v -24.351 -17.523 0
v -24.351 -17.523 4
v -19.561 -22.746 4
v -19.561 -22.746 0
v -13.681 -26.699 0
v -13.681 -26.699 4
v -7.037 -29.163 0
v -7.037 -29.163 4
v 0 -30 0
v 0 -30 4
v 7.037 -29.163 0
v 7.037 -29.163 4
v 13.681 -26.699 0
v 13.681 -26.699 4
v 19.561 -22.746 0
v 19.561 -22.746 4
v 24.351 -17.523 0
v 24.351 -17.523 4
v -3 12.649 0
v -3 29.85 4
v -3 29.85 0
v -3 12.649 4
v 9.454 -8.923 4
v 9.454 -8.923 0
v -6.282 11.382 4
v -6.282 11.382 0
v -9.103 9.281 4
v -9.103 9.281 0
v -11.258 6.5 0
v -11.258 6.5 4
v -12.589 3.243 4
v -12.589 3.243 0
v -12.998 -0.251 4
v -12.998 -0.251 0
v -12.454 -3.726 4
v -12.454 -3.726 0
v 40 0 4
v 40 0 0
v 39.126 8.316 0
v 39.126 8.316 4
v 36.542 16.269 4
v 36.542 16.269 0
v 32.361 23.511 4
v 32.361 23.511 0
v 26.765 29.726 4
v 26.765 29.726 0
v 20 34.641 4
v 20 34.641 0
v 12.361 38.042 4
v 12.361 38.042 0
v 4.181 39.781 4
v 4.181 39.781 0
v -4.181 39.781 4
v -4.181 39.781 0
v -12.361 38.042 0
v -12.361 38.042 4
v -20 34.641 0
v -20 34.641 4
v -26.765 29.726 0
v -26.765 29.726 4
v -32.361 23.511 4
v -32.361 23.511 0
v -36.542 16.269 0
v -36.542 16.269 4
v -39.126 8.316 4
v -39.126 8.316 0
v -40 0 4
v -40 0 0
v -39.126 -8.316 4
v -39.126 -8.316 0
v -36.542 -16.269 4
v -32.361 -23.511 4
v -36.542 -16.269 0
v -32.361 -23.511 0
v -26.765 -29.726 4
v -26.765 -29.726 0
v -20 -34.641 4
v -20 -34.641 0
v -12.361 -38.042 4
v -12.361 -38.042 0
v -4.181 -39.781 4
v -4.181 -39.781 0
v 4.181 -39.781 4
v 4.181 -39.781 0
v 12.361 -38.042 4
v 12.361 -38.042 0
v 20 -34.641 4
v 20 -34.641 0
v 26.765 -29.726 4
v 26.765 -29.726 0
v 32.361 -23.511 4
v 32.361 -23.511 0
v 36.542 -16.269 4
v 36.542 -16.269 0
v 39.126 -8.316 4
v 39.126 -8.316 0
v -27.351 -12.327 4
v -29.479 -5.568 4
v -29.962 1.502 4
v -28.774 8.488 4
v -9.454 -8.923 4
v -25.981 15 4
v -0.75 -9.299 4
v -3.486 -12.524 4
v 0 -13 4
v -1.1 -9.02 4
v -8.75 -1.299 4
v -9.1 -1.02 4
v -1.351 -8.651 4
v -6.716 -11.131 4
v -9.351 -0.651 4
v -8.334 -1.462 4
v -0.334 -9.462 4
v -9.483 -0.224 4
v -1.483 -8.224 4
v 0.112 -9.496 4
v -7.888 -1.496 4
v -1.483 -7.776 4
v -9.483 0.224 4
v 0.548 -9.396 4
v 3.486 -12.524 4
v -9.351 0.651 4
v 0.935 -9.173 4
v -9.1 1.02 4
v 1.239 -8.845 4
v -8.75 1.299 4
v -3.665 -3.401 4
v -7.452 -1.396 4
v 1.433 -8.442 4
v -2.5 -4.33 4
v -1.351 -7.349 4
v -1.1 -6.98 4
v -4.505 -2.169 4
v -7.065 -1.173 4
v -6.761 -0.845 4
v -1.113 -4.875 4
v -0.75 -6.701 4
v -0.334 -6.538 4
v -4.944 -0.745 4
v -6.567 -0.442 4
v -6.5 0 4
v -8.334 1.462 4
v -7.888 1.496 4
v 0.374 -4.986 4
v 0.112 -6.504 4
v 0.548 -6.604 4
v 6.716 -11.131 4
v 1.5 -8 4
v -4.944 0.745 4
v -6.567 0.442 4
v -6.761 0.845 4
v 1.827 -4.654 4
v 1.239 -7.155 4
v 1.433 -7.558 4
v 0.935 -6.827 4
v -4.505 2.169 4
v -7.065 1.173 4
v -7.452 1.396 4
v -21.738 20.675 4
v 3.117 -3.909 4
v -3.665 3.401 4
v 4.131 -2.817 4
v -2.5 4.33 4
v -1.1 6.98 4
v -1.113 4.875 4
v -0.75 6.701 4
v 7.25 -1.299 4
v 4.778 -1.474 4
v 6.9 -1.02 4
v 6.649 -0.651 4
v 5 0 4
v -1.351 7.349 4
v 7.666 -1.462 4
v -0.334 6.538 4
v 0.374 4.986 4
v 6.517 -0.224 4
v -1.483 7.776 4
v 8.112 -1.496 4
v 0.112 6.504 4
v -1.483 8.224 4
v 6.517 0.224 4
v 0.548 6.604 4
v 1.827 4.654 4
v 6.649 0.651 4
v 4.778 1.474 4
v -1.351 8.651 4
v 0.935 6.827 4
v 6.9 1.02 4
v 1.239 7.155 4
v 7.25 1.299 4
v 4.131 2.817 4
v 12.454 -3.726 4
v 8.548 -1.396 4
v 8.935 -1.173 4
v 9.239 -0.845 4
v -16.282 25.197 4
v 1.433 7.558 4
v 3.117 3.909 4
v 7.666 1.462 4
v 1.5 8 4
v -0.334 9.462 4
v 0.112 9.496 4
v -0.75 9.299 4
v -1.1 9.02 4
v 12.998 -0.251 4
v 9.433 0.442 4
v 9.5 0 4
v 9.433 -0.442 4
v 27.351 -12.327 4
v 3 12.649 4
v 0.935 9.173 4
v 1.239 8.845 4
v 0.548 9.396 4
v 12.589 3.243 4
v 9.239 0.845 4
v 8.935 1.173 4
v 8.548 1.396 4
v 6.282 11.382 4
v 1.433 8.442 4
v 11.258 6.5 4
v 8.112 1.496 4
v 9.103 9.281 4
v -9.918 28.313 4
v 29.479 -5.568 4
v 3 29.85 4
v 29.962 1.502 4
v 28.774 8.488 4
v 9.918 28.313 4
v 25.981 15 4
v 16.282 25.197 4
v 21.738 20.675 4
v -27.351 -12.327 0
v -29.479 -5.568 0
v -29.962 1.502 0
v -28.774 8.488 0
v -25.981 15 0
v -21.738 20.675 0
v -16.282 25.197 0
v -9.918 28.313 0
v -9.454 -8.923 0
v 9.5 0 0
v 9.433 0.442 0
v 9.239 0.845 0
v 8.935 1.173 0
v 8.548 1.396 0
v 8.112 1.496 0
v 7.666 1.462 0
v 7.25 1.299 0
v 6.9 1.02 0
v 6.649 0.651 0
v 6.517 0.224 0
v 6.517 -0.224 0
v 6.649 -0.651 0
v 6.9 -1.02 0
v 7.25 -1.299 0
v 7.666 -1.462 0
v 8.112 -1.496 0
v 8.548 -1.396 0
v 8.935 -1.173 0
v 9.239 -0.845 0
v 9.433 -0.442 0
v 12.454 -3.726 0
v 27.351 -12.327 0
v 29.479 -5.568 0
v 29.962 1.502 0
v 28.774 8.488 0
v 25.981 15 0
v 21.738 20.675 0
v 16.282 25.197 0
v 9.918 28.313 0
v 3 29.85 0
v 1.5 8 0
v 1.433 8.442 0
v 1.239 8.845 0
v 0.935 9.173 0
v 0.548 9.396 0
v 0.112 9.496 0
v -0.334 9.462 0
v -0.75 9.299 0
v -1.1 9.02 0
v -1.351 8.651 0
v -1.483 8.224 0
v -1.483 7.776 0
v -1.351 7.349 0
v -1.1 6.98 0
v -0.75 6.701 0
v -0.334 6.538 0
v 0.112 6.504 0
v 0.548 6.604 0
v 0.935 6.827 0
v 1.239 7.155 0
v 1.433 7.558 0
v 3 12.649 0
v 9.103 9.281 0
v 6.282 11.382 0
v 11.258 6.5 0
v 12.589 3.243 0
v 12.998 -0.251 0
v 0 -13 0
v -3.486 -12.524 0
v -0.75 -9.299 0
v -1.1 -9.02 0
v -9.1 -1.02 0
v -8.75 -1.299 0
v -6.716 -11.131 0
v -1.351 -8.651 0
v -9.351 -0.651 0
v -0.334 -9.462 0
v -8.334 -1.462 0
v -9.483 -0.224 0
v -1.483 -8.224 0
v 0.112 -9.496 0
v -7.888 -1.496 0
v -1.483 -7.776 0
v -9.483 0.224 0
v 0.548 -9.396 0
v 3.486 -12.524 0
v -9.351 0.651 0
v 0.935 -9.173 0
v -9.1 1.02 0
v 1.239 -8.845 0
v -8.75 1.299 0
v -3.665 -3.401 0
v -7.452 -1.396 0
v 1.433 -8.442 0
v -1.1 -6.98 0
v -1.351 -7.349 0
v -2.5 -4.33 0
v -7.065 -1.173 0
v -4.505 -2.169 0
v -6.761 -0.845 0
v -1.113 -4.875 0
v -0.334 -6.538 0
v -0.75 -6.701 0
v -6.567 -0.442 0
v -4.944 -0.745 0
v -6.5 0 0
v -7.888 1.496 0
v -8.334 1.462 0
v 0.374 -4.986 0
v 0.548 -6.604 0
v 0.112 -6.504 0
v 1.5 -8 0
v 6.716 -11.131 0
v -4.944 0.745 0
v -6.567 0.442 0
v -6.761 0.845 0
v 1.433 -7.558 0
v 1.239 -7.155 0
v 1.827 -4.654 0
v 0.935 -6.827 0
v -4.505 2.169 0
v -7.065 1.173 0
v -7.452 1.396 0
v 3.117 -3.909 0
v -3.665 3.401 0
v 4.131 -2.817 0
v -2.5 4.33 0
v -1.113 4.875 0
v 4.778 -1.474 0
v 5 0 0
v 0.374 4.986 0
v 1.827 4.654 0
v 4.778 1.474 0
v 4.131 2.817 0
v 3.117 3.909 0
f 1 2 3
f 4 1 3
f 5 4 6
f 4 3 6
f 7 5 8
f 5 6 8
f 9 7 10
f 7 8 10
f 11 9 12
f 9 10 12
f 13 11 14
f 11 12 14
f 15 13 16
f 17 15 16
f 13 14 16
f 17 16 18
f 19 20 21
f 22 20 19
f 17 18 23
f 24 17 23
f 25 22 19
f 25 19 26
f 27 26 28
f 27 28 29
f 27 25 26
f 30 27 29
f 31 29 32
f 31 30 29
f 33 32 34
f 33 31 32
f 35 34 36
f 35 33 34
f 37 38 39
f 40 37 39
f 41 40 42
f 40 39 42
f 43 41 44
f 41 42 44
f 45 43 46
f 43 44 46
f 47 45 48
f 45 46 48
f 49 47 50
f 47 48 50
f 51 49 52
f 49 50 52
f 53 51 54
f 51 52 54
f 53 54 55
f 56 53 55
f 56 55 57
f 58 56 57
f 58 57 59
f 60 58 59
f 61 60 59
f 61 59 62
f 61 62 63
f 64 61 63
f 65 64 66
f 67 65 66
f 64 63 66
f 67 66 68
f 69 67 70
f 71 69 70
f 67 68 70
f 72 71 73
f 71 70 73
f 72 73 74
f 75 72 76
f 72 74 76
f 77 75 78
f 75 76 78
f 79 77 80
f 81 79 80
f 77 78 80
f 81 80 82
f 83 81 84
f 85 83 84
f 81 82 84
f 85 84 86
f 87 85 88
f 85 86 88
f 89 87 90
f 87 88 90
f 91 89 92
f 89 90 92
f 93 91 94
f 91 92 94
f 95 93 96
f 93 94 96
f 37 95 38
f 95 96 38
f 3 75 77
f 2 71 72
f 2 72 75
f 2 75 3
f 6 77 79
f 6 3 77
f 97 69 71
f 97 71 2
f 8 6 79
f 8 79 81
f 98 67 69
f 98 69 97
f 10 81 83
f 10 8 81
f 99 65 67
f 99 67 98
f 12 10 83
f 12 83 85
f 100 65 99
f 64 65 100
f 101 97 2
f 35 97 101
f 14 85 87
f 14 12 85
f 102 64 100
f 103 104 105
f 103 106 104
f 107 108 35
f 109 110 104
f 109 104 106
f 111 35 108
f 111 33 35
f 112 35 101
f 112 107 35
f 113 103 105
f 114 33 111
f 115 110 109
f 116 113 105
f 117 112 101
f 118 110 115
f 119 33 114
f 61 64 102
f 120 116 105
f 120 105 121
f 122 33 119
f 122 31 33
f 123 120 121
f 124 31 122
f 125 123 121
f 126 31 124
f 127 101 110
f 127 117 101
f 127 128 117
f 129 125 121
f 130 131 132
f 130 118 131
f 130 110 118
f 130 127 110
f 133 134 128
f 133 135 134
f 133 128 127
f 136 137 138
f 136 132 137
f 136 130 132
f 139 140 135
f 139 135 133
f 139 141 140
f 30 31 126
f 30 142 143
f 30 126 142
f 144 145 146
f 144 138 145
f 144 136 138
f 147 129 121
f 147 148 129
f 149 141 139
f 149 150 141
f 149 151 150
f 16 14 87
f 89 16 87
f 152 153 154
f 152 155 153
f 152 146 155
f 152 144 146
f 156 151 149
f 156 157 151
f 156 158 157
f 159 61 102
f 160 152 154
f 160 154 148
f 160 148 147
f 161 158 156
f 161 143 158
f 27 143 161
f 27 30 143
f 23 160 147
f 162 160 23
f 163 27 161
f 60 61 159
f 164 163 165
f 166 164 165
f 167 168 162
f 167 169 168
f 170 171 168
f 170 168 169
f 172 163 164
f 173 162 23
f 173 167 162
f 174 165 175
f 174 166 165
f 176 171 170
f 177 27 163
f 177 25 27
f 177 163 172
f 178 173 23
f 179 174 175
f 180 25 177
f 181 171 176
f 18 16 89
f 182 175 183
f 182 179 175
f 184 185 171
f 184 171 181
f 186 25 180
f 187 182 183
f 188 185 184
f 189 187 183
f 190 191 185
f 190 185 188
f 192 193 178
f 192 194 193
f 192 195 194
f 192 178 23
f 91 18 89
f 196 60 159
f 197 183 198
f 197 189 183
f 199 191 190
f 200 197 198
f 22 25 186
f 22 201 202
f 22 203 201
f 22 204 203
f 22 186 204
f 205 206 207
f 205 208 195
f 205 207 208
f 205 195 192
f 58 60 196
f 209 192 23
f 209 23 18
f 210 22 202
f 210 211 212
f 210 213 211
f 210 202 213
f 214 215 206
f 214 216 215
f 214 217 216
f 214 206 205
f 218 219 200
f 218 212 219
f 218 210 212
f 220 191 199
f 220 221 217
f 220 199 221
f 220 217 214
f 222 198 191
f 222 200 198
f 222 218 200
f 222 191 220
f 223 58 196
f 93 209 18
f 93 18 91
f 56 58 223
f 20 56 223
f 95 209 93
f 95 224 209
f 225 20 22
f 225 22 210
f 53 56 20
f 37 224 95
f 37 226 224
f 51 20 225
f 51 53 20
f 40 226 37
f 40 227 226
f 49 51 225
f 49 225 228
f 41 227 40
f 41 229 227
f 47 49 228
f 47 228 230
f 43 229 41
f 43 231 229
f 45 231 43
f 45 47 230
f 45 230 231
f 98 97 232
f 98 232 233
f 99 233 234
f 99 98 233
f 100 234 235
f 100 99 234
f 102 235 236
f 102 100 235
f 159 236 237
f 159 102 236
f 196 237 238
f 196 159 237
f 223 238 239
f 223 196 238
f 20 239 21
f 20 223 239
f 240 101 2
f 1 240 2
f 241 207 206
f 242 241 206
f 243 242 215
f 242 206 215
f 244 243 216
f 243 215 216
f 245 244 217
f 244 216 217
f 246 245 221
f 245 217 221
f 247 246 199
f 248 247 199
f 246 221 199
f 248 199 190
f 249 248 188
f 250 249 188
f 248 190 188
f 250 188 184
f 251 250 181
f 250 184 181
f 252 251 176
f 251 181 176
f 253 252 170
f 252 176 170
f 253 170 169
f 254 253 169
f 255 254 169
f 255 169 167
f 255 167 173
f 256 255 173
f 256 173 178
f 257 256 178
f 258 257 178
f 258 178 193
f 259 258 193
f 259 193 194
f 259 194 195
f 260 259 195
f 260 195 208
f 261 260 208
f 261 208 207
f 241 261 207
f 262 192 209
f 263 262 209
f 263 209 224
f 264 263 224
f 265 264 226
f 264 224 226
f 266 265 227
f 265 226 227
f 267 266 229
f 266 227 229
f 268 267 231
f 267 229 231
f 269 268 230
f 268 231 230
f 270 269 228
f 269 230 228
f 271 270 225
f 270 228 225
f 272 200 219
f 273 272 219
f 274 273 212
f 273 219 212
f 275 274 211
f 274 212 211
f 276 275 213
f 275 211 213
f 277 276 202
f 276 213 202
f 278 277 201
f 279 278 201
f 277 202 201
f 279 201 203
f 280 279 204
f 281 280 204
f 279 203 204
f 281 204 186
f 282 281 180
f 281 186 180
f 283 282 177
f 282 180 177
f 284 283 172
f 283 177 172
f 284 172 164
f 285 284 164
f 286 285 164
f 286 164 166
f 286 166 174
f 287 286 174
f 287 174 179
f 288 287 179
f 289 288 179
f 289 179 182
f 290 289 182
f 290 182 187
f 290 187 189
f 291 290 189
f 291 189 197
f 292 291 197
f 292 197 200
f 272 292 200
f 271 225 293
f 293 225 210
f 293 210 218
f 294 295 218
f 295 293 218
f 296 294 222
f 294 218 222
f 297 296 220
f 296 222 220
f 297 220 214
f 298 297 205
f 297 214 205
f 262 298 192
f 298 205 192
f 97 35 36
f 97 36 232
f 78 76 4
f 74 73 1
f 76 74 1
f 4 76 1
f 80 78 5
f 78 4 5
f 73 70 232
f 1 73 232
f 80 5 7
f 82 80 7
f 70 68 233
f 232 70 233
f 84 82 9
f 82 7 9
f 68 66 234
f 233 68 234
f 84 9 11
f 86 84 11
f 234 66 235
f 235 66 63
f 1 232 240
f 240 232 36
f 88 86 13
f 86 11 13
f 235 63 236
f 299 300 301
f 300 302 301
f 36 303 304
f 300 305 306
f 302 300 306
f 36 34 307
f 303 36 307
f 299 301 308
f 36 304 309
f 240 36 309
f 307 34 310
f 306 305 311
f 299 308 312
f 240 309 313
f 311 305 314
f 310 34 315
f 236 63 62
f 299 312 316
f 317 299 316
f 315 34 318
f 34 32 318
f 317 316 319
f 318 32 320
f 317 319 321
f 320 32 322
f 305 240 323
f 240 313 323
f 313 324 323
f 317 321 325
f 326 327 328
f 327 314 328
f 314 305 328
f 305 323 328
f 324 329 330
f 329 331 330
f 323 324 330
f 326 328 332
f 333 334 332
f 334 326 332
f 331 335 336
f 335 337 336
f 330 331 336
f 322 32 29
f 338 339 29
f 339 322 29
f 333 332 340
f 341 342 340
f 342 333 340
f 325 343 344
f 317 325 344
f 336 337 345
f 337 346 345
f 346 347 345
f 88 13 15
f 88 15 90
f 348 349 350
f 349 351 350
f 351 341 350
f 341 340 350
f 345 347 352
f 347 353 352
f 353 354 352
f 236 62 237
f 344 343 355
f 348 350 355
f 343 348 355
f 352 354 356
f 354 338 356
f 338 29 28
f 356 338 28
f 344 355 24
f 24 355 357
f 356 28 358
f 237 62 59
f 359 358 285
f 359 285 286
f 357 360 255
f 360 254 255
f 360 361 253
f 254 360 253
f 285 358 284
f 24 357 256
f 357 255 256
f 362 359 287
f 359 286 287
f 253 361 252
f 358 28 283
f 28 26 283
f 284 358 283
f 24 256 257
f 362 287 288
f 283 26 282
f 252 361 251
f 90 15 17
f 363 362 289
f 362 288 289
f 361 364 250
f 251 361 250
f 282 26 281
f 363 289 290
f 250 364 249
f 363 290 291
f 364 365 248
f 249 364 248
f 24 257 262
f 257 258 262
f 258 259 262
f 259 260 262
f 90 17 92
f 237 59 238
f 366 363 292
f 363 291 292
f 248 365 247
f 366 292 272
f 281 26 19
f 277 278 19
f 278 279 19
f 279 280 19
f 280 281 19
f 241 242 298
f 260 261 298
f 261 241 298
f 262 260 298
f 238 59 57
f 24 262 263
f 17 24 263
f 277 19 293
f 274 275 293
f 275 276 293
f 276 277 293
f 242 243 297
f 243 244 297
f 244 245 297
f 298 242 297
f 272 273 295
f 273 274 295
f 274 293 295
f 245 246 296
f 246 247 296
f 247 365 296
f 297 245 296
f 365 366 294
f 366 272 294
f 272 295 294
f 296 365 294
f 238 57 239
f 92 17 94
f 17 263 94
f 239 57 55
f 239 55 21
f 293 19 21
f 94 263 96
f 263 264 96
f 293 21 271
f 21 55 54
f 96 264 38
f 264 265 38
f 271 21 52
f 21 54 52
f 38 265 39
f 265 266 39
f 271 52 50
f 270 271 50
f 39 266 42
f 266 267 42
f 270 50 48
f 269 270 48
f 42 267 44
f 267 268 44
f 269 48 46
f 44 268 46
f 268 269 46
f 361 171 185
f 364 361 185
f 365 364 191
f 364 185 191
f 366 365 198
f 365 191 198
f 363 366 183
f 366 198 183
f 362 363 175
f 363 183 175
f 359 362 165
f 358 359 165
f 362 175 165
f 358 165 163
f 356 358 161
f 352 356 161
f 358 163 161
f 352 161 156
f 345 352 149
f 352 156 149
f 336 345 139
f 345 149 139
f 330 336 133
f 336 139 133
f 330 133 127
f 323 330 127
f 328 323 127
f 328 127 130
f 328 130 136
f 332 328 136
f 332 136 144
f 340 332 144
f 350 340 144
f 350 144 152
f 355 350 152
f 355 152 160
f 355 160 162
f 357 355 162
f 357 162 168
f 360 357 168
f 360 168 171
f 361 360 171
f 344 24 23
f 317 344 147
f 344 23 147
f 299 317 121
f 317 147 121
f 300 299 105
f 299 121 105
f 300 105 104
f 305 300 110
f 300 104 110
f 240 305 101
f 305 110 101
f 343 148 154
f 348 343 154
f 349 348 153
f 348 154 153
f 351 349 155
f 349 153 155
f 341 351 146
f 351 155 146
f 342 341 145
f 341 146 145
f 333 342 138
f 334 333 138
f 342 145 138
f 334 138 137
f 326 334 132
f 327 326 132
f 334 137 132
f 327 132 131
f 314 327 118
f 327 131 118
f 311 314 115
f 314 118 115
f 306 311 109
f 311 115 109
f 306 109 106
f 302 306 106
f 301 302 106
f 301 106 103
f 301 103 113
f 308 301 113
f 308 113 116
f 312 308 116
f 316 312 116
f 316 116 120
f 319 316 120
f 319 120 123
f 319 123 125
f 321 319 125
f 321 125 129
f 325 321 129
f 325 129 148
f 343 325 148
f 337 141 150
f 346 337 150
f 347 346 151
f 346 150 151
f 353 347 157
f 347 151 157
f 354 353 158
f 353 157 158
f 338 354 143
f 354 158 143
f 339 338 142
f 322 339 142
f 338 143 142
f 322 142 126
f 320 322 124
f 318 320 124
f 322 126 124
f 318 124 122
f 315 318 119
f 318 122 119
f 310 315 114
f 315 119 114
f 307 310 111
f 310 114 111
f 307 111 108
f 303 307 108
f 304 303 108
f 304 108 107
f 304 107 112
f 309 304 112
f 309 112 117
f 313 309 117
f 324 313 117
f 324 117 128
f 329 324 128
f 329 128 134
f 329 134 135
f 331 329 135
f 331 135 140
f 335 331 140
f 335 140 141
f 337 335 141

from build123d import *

# Parameters (mm, degrees)
SKETCH_1_R          = 40
EXTRUDE_1_DEPTH     = 4
SKETCH_2_R          = 5
SKETCH_2_R_2        = 1.5
CUT_EXTRUDE_1_DEPTH = 5


with BuildPart() as part:
    # 草图1 → 凸台-拉伸1 (new body)
    with BuildSketch(Plane.XY):
        Circle(SKETCH_1_R)
    extrude(amount=EXTRUDE_1_DEPTH)

    # 草图2 → 切除-拉伸1 (cut, through all)
    with BuildSketch(Plane.XY.offset(4)):
        Circle(SKETCH_2_R)
        with Locations((-8, 0)):
            Circle(SKETCH_2_R_2)
        with Locations((0, 8)):
            Circle(SKETCH_2_R_2)
        with Locations((8, 0)):
            Circle(SKETCH_2_R_2)
        with Locations((0, -8)):
            Circle(SKETCH_2_R_2)
        with BuildLine():
            Line((-3, 29.849623113), (-3, 12.649110641))
            ThreePointArc((-3, 12.649110641), (-11.258330249, 6.5), (-12.45445115, -3.726479109))
            Line((-12.45445115, -3.726479109), (-27.350531909, -12.326735345))
            ThreePointArc((-27.350531909, -12.326735345), (-25.980762114, 15), (-3, 29.849623113))
        make_face()
        with BuildLine():
            Line((3, 29.849623113), (3, 12.649110641))
            ThreePointArc((3, 12.649110641), (11.258330249, 6.5), (12.45445115, -3.726479109))
            Line((12.45445115, -3.726479109), (27.350531909, -12.326735345))
            ThreePointArc((27.350531909, -12.326735345), (25.980762114, 15), (3, 29.849623113))
        make_face()
        with BuildLine():
            Line((24.350531909, -17.522887768), (9.45445115, -8.922631532))
            ThreePointArc((9.45445115, -8.922631532), (0, -13), (-9.45445115, -8.922631532))
            Line((-9.45445115, -8.922631532), (-24.350531909, -17.522887768))
            ThreePointArc((-24.350531909, -17.522887768), (0, -30), (24.350531909, -17.522887768))
        make_face()
    extrude(amount=-CUT_EXTRUDE_1_DEPTH, mode=Mode.SUBTRACT)


solid = part.part
